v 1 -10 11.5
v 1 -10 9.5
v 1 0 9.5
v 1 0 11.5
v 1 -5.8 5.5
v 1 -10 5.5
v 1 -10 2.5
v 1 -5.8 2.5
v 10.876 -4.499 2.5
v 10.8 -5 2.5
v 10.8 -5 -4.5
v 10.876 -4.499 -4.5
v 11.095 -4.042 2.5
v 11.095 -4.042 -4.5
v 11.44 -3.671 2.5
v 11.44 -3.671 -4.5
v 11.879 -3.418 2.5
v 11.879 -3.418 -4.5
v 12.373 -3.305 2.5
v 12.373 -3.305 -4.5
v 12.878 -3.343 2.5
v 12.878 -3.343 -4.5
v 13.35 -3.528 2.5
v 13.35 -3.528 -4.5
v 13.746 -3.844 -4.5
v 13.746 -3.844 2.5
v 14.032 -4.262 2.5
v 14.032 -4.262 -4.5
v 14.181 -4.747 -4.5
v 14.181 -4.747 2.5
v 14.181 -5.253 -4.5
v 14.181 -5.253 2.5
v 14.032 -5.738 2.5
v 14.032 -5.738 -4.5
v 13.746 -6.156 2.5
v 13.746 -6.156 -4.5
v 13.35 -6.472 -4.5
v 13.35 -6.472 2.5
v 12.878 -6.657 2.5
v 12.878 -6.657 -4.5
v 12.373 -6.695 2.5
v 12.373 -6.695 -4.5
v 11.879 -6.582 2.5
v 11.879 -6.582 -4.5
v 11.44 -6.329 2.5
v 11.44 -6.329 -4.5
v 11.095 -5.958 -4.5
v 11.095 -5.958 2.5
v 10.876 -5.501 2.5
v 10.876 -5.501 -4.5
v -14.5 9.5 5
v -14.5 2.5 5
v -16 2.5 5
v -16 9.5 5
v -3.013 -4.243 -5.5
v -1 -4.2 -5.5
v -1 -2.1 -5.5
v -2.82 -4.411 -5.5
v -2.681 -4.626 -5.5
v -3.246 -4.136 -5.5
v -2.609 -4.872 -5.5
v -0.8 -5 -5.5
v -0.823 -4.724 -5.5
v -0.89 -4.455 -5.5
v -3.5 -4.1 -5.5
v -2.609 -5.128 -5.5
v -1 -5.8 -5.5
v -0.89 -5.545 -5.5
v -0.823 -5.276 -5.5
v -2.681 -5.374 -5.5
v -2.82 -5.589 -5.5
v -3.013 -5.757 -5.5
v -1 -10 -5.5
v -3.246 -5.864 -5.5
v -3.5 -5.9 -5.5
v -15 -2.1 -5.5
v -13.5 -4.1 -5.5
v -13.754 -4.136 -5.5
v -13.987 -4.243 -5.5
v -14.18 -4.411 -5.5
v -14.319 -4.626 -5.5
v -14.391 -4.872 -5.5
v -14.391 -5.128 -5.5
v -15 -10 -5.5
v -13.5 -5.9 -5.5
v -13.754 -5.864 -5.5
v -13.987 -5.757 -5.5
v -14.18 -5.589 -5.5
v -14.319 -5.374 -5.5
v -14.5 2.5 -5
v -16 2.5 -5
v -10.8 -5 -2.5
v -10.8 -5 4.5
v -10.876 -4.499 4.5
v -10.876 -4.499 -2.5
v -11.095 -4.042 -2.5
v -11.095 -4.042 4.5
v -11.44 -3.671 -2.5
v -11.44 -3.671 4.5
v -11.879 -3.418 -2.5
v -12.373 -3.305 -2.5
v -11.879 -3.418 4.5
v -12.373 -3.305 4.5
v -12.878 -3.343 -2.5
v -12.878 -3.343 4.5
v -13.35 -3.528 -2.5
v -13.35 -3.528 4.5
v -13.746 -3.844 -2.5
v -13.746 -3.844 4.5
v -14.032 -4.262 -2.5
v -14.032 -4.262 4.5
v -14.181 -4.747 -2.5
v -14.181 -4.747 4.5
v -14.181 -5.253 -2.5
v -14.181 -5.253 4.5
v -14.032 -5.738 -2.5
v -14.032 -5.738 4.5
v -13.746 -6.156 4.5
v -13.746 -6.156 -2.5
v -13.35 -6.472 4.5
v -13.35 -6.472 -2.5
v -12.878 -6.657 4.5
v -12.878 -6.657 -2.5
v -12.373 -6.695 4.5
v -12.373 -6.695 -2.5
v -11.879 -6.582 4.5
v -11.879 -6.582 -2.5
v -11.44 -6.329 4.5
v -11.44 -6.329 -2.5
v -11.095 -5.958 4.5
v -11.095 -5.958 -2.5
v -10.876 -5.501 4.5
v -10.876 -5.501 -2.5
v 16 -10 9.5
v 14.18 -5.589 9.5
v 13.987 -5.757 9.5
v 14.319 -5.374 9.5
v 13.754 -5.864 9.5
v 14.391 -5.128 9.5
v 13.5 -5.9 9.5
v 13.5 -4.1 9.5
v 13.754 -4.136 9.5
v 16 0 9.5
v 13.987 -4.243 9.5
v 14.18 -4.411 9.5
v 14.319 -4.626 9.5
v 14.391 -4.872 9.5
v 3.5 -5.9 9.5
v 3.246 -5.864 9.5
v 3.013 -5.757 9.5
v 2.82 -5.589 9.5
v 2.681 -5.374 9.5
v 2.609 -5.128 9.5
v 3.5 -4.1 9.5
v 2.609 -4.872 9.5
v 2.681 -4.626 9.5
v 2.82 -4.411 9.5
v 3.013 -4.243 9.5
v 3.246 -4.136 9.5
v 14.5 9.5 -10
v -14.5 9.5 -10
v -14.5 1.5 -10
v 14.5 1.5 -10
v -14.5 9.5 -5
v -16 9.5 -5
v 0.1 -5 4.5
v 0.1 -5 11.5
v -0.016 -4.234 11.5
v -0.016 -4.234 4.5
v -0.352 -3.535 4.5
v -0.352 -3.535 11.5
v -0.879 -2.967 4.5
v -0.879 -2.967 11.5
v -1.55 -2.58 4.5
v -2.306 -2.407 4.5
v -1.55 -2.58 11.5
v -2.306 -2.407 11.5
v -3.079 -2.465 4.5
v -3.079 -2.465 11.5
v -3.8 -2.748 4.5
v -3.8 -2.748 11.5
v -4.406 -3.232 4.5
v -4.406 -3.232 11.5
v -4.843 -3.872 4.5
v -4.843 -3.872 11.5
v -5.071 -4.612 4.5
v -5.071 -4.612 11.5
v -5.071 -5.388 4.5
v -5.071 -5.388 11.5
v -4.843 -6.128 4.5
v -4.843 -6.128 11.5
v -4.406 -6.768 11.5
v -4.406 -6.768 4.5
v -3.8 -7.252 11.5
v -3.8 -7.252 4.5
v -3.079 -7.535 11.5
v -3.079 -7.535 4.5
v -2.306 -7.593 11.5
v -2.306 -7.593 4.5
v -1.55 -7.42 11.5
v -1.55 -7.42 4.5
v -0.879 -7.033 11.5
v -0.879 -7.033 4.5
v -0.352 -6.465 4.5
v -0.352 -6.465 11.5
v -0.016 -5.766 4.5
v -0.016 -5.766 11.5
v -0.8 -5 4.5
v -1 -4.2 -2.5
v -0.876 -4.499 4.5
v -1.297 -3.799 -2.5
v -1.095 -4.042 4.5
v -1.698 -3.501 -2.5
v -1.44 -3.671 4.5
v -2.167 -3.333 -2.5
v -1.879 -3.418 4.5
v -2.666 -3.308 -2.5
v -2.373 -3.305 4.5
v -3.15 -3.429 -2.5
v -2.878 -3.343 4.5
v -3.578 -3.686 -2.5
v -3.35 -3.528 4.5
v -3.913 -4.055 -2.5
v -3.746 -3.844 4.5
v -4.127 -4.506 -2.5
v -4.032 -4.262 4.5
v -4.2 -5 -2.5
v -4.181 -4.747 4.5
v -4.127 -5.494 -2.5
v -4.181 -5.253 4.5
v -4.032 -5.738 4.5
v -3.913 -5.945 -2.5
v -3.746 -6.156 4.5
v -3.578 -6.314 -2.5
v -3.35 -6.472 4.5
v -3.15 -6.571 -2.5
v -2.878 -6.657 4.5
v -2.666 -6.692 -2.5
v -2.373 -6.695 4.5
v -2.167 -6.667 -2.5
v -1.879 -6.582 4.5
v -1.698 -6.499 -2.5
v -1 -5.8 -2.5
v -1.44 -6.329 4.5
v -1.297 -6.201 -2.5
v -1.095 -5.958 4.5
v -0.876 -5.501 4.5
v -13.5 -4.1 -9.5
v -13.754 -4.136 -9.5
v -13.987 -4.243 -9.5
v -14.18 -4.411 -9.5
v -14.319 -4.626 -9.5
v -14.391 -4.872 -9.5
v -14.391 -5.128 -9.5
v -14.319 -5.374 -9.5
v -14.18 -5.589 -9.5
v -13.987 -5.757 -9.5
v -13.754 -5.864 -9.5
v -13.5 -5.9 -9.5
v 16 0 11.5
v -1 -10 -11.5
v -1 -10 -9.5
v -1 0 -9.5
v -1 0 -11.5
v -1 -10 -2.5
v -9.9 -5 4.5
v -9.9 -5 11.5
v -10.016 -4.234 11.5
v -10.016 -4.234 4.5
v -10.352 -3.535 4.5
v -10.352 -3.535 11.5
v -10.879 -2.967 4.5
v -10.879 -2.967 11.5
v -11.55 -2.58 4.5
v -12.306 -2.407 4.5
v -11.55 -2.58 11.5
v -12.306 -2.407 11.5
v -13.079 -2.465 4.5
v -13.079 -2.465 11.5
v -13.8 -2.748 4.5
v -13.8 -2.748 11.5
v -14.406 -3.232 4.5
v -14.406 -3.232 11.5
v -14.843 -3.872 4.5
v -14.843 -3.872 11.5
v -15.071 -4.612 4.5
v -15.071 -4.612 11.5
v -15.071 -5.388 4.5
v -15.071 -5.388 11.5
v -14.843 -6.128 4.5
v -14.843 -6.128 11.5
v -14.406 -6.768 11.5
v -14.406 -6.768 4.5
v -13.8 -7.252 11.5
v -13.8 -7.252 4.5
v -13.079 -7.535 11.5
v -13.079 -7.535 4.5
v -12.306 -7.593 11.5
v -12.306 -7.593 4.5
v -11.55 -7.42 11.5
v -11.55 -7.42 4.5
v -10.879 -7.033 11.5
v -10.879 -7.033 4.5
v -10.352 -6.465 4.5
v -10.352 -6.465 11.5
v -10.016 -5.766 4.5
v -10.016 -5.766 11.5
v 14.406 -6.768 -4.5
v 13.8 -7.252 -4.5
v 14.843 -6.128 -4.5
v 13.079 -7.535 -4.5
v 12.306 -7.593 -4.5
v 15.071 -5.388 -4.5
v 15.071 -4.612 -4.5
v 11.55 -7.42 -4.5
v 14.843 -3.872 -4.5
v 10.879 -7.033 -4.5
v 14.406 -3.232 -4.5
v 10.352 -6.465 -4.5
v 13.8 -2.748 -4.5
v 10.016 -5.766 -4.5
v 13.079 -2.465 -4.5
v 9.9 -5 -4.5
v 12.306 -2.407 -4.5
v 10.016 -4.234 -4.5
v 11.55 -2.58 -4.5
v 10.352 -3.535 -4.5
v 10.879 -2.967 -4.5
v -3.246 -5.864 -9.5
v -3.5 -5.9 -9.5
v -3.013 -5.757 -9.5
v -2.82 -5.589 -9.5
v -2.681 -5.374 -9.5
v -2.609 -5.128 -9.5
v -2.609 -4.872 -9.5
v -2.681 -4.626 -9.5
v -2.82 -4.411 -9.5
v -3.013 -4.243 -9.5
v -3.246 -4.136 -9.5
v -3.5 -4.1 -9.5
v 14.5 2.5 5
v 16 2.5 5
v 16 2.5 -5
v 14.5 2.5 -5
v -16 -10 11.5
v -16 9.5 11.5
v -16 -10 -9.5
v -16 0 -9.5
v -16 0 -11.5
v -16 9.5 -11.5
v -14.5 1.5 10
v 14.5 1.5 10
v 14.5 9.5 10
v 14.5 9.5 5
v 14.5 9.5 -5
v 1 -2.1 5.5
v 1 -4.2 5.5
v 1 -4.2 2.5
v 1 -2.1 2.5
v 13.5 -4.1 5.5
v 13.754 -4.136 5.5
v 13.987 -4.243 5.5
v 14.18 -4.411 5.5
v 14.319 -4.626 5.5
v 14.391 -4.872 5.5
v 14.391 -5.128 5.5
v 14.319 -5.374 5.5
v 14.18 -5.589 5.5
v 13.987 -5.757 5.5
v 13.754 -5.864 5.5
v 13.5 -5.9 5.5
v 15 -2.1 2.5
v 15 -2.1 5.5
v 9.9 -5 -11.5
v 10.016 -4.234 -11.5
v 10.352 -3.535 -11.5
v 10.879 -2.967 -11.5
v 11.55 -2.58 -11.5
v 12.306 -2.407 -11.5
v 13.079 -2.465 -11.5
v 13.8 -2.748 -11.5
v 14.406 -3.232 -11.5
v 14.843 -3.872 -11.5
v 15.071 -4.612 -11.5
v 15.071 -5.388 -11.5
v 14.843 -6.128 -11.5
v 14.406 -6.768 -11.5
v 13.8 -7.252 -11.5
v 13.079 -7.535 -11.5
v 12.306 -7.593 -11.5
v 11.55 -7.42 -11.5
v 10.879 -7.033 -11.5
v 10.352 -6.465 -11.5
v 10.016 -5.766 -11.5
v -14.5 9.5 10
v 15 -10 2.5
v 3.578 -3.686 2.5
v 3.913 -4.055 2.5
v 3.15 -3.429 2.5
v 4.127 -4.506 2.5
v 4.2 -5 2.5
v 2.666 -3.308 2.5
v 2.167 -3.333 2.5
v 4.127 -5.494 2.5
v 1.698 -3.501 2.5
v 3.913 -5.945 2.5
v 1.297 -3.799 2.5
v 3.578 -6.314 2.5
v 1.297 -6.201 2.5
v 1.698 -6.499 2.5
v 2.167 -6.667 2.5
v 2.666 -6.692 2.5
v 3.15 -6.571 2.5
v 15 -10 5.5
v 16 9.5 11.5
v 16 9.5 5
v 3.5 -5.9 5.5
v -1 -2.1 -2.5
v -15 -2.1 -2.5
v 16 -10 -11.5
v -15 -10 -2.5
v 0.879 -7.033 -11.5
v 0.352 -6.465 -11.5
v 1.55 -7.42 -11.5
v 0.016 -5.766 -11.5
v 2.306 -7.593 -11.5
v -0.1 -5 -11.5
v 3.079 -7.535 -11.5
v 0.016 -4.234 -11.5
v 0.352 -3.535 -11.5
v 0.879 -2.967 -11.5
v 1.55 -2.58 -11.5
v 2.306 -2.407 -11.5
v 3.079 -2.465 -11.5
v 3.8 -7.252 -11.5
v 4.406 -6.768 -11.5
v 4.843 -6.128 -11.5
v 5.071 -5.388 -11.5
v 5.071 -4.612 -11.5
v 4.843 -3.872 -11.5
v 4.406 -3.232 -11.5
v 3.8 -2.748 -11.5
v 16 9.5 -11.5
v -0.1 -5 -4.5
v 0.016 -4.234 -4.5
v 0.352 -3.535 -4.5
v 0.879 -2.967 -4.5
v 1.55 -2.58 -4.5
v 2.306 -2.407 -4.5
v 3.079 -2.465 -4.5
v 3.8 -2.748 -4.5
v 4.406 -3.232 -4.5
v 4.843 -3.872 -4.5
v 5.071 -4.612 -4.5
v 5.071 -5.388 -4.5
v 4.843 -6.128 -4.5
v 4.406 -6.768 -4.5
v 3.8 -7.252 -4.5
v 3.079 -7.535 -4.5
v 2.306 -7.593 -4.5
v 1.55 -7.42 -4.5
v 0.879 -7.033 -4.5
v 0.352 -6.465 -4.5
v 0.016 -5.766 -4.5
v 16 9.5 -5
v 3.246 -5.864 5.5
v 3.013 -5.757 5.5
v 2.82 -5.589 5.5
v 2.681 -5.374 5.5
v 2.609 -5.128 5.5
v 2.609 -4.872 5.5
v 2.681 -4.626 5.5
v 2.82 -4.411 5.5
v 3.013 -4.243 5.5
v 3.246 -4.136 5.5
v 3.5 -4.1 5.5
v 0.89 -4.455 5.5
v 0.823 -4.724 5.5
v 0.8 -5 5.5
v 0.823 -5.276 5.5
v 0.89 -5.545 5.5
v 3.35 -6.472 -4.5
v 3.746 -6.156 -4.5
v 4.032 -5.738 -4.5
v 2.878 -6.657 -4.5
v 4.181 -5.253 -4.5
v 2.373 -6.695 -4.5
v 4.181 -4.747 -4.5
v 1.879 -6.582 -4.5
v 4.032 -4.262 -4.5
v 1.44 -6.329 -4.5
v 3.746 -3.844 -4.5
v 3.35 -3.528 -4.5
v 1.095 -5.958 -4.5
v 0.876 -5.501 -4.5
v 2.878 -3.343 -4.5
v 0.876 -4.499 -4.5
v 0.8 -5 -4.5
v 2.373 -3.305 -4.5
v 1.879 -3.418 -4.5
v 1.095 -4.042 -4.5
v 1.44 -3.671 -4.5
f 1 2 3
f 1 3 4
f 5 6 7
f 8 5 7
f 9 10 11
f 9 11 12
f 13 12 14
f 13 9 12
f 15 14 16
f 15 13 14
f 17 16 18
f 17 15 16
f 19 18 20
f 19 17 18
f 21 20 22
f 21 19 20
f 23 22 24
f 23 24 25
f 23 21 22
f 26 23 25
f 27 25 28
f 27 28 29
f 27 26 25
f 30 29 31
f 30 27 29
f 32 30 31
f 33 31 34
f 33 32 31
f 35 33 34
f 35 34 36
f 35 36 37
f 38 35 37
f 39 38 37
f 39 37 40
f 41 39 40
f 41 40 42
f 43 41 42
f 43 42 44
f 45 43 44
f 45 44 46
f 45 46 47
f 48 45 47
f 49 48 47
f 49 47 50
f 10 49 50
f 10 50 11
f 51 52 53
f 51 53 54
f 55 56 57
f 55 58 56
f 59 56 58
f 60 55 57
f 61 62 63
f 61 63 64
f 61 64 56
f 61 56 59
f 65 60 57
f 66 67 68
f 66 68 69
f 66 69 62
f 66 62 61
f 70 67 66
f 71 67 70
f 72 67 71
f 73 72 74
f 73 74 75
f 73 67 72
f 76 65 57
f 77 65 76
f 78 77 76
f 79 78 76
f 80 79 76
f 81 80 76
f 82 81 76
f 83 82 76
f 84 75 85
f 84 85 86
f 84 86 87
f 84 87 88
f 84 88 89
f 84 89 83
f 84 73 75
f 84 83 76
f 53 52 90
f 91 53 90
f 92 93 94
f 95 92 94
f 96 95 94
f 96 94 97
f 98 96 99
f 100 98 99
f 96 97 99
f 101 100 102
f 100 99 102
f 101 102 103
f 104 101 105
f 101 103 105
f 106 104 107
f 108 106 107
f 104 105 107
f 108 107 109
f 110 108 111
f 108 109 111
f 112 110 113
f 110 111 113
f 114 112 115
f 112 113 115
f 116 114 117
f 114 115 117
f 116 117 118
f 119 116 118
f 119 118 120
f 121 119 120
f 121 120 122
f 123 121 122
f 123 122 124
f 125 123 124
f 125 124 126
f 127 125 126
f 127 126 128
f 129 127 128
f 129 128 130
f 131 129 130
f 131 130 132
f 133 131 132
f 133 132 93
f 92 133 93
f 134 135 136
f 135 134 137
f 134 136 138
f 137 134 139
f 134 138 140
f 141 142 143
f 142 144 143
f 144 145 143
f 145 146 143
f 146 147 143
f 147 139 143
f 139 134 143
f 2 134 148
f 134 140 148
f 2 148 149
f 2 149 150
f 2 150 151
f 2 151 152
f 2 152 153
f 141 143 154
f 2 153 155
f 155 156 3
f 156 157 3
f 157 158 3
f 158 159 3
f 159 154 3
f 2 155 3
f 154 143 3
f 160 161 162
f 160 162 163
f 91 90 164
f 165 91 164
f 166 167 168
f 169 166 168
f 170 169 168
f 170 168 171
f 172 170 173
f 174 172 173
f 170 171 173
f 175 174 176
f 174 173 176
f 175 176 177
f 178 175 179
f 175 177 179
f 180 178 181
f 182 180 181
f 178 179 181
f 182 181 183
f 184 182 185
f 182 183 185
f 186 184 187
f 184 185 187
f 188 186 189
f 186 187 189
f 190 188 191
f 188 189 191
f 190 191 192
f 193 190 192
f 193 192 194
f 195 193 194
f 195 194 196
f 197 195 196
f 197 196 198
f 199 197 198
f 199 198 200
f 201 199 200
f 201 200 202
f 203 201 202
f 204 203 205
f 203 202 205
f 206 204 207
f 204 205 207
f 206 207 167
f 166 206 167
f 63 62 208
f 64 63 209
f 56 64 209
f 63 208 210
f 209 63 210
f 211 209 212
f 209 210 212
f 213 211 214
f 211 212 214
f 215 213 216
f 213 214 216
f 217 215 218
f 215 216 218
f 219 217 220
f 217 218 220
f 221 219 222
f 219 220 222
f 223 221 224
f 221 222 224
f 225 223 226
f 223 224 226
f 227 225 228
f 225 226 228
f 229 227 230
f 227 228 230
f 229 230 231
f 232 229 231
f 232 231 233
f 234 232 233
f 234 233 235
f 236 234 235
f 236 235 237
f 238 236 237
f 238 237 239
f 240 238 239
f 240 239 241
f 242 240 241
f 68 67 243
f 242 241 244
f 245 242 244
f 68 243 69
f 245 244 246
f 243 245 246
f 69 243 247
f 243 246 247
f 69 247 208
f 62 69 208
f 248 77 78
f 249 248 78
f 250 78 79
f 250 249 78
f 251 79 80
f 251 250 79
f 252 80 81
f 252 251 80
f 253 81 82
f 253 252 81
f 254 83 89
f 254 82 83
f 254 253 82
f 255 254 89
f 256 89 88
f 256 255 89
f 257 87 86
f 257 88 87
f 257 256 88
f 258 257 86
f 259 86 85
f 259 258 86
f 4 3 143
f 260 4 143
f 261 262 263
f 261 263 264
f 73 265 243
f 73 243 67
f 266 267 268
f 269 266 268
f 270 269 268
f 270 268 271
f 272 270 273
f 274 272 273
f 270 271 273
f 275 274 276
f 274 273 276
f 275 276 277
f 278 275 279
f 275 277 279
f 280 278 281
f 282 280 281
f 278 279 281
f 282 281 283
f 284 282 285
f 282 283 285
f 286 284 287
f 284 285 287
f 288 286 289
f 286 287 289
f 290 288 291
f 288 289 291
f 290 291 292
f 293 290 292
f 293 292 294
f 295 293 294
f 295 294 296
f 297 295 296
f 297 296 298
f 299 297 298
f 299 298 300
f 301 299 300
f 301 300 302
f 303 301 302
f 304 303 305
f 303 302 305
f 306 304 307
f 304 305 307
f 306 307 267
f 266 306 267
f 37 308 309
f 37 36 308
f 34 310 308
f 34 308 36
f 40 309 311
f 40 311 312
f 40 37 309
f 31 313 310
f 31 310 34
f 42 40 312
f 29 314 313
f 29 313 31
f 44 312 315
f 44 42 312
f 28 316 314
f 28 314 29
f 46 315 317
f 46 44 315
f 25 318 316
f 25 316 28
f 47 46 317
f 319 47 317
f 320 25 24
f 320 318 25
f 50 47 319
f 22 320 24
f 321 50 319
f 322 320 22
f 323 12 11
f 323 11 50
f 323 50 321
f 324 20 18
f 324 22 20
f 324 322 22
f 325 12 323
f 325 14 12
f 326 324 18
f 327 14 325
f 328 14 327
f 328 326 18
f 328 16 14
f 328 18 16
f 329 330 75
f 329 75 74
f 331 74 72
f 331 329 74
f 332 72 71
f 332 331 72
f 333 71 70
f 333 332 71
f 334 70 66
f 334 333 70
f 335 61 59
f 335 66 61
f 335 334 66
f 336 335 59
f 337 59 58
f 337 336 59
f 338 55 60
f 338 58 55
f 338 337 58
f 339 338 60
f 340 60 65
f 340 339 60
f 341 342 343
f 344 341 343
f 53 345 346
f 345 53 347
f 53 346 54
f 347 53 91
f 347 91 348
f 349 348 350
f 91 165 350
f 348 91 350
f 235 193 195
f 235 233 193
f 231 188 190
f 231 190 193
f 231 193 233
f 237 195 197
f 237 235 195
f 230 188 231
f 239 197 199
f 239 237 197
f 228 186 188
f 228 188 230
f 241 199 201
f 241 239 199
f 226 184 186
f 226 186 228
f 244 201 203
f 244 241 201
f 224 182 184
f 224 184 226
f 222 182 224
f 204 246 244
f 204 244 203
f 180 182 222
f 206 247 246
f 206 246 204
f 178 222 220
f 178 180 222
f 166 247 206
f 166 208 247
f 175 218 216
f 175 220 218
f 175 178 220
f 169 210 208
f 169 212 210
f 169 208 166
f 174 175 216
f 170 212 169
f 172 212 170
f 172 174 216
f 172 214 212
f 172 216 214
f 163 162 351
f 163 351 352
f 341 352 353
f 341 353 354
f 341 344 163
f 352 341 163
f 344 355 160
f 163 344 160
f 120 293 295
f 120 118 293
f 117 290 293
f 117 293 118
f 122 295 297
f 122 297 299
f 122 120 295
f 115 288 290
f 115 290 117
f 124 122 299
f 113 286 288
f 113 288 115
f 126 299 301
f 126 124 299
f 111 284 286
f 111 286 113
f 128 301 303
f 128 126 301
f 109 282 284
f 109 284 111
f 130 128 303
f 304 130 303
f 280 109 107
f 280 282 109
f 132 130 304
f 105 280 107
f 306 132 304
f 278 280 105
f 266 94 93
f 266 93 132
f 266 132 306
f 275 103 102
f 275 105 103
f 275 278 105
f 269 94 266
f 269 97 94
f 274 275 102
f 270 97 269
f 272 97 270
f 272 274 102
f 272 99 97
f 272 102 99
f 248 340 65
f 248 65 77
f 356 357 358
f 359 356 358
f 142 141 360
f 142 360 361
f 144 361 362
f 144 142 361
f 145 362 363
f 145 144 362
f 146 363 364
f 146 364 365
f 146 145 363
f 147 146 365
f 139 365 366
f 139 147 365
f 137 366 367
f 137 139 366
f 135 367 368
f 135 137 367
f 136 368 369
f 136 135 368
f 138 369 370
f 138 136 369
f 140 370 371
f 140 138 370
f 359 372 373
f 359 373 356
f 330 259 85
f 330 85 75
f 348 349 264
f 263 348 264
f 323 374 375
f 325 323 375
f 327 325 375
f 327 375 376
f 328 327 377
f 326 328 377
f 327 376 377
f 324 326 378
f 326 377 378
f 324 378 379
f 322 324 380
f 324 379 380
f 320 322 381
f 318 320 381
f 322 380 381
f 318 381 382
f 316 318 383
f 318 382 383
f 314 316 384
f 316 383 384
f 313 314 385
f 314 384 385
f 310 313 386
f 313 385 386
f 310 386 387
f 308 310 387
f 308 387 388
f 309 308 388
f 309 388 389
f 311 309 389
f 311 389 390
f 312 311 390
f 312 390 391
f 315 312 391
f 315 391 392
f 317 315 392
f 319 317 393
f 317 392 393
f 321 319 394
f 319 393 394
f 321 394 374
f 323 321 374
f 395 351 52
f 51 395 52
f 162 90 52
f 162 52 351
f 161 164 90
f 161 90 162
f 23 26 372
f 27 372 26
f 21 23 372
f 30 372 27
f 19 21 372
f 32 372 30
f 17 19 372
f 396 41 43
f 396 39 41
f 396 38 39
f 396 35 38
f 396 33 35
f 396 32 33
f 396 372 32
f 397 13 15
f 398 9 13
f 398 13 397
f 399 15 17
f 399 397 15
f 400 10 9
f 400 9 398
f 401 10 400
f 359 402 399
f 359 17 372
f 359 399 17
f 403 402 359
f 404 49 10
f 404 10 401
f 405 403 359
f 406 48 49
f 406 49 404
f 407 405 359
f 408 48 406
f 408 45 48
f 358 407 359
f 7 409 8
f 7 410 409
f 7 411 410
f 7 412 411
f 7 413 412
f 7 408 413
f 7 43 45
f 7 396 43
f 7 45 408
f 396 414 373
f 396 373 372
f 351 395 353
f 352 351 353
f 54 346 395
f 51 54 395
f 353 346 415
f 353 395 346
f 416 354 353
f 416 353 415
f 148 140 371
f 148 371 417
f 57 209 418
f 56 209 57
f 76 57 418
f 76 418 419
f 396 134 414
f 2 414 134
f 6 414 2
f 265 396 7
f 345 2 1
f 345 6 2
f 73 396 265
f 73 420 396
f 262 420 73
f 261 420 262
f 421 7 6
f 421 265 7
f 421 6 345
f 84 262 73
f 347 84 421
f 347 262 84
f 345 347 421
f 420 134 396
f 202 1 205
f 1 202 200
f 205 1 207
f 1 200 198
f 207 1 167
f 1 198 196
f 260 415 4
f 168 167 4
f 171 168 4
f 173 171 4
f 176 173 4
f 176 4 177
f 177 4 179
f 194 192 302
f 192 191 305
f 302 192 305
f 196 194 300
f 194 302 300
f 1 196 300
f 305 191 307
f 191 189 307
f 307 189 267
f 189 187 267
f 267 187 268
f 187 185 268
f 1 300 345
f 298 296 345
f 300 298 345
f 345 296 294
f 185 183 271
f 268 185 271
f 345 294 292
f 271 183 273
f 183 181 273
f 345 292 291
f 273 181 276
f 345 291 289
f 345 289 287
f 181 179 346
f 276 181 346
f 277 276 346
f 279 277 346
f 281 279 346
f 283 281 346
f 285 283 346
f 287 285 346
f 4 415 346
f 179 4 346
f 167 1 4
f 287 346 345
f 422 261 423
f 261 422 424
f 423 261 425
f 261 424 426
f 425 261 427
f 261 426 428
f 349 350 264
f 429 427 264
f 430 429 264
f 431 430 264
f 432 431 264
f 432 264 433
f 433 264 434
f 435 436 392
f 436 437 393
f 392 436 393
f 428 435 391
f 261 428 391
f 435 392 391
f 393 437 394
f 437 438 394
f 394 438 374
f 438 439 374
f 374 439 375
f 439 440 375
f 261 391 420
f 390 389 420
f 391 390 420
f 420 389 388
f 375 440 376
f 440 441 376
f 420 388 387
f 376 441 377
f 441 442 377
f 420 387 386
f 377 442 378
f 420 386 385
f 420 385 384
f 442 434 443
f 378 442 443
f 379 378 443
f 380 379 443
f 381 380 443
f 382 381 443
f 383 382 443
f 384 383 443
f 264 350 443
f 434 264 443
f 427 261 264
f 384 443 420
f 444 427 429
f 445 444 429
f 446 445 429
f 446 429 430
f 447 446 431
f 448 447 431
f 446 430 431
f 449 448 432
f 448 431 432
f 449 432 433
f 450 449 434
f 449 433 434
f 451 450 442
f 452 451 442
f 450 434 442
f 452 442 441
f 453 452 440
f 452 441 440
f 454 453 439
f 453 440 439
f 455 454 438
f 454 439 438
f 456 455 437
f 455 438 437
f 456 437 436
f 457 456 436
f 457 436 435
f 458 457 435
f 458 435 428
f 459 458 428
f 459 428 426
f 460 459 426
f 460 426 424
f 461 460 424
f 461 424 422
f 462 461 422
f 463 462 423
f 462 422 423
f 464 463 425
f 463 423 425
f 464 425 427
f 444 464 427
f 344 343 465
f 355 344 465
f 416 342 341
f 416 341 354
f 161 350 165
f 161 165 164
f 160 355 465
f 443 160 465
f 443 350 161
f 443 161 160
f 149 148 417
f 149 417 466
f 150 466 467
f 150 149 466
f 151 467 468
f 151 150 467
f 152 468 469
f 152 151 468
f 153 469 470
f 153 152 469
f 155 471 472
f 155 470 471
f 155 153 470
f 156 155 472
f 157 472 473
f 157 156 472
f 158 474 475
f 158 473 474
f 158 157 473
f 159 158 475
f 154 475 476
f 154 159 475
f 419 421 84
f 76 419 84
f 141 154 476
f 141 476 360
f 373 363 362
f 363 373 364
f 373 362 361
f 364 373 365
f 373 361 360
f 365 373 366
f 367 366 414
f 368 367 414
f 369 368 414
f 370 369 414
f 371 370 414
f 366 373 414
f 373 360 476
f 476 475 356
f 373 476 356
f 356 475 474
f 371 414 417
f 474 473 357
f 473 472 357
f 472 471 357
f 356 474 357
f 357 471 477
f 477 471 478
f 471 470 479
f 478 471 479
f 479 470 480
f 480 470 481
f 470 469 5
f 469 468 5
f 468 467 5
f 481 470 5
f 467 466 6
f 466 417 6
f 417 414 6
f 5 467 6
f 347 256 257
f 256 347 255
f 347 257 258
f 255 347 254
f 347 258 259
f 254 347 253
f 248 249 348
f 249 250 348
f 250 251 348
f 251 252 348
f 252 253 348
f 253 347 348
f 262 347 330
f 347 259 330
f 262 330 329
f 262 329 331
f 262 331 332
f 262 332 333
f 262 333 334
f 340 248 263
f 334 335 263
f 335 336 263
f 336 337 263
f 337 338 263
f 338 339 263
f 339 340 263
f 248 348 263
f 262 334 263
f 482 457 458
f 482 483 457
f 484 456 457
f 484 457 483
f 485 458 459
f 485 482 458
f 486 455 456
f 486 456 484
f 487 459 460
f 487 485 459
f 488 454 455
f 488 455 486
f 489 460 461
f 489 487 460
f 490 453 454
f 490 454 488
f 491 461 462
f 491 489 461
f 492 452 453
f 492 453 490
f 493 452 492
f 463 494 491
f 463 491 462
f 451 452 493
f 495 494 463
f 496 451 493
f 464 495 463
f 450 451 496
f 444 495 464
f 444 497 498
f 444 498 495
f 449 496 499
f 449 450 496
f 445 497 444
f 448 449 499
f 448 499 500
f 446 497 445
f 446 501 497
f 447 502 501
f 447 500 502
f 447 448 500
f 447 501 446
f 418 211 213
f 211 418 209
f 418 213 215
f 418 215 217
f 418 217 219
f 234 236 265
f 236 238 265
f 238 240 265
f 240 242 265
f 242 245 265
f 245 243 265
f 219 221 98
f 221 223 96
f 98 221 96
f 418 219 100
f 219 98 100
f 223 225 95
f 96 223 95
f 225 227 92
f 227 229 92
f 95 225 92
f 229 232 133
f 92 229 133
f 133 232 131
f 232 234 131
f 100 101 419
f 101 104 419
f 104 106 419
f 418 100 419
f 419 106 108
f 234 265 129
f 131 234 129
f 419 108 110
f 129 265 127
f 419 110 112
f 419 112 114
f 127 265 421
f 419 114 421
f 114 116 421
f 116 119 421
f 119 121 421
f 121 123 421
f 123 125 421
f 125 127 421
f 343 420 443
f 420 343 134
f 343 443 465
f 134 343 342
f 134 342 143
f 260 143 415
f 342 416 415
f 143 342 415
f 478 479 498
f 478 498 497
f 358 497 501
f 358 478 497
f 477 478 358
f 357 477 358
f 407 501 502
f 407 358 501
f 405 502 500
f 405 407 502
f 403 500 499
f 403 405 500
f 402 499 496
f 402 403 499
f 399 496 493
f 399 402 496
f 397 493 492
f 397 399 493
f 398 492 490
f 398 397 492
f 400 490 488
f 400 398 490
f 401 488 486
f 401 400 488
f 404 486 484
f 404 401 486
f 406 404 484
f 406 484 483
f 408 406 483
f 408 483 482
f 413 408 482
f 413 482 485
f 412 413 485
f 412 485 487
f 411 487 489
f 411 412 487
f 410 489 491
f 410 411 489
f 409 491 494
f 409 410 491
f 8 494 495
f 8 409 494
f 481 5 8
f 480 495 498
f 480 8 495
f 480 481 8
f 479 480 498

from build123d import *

# Parameters (mm, degrees)
SKETCH4_W           = 32
SKETCH4_H           = 23
BOSS_EXTRUDE3_DEPTH = 9.5
SKETCH5_W           = 29
SKETCH5_H           = 20
CUT_EXTRUDE2_DEPTH  = 8
SKETCH7_W           = 10
SKETCH7_H           = 7
CUT_EXTRUDE4_DEPTH  = 36.305806888
BOSS_EXTRUDE4_DEPTH = 10
CUT_EXTRUDE5_DEPTH  = 5
SKETCH10_W          = 14
SKETCH10_H          = 3
CUT_EXTRUDE6_DEPTH  = 7.9
CIRPATTERN1_COUNT   = 2
SKETCH11_R          = 2.6
CUT_EXTRUDE7_DEPTH  = 7
CIRPATTERN2_COUNT   = 2
CUT_EXTRUDE8_REACH  = 26.739
SKETCH12_R          = 1.7
CUT_EXTRUDE9_START  = -10
SKETCH13_R          = 1.7
CUT_EXTRUDE9_DEPTH  = 10


with BuildPart() as part:
    # Sketch4 → Boss-Extrude3 (new body)
    with BuildSketch(Plane(origin=(0, 0, 0), x_dir=(1, 0, 0), z_dir=(0, 1, 0))):
        Rectangle(SKETCH4_W, SKETCH4_H)
    extrude(amount=BOSS_EXTRUDE3_DEPTH)

    # Sketch5 → Cut-Extrude2 (cut)
    with BuildSketch(Plane(origin=(0, 9.5, 0), x_dir=(1, 0, 0), z_dir=(0, 1, 0))):
        Rectangle(SKETCH5_W, SKETCH5_H)
    extrude(amount=-CUT_EXTRUDE2_DEPTH, mode=Mode.SUBTRACT)

    # Sketch7 → Cut-Extrude4 (cut, through all)
    with BuildSketch(Plane(origin=(16, 0, 0), x_dir=(0, 0, -1), z_dir=(1, 0, 0))):
        with Locations((0, 6)):
            Rectangle(SKETCH7_W, SKETCH7_H)
    extrude(amount=-CUT_EXTRUDE4_DEPTH, mode=Mode.SUBTRACT)

    # Sketch8 → Boss-Extrude4 (add)
    with BuildSketch(Plane(origin=(0, 0, 0), x_dir=(-1, 0, 0), z_dir=(0, -1, 0))):
        Polygon((-16, -9.5), (-1, -9.5), (-1, -11.5), (16, -11.5), (16, 9.5), (1, 9.5), (1, 11.5), (-16, 11.5), align=None)
    extrude(amount=BOSS_EXTRUDE4_DEPTH)

    # Sketch9 → Cut-Extrude5 (cut)
    with BuildSketch(Plane(origin=(0, 0, -9.5), x_dir=(-1, 0, 0), z_dir=(0, 0, -1))):
        with BuildLine():
            Line((3.5, -4.1), (13.5, -4.1))
            ThreePointArc((13.5, -4.1), (14.4, -5), (13.5, -5.9))
            Line((13.5, -5.9), (3.5, -5.9))
            ThreePointArc((3.5, -5.9), (2.6, -5), (3.5, -4.1))
        make_face()
    cut_extrude5 = extrude(amount=-CUT_EXTRUDE5_DEPTH, mode=Mode.SUBTRACT)

    # Sketch10 → Cut-Extrude6 (cut)
    with BuildSketch(Plane(origin=(0, -10, 0), x_dir=(-1, 0, 0), z_dir=(0, -1, 0))):
        with Locations((-8, -4)):
            Rectangle(SKETCH10_W, SKETCH10_H)
        with Locations((8, 4)):
            Rectangle(SKETCH10_W, SKETCH10_H)
    extrude(amount=-CUT_EXTRUDE6_DEPTH, mode=Mode.SUBTRACT)

    # CirPattern1: Cut-Extrude5 ×2 about axis
    cirpattern1_axis = Axis((0, 0, 0), (0, -1, 0))
    for i in range(1, CIRPATTERN1_COUNT):
        add(cut_extrude5.rotate(cirpattern1_axis, i * 360 / CIRPATTERN1_COUNT), mode=Mode.SUBTRACT)

    # Sketch11 → Cut-Extrude7 (cut)
    with BuildSketch(Plane(origin=(0, 0, -11.5), x_dir=(-1, 0, 0), z_dir=(0, 0, -1))):
        with Locations((-12.5, -5)):
            Circle(SKETCH11_R)
        with Locations((-2.5, -5)):
            Circle(SKETCH11_R)
    cut_extrude7 = extrude(amount=-CUT_EXTRUDE7_DEPTH, mode=Mode.SUBTRACT)

    # CirPattern2: Cut-Extrude7 ×2 about axis
    cirpattern2_axis = Axis((0, 0, 0), (0, -1, 0))
    for i in range(1, CIRPATTERN2_COUNT):
        add(cut_extrude7.rotate(cirpattern2_axis, i * 360 / CIRPATTERN2_COUNT), mode=Mode.SUBTRACT)

    # Cut-Extrude8: up to this face of the body (flat: up to its plane)
    cut_extrude8_end = Plane(part.part.faces().sort_by_distance((-7.885932934, -6.28954084, -5.5))[0])
    # Sketch12 → Cut-Extrude8 (cut, up to the picked face)
    with BuildSketch(Plane.XY.offset(4.5), mode=Mode.PRIVATE) as cut_extrude8_sk1:
        with Locations((-2.5, -5)):
            Circle(SKETCH12_R)
    cut_extrude8_tool1 = split(extrude(cut_extrude8_sk1.sketch, amount=-CUT_EXTRUDE8_REACH, mode=Mode.PRIVATE), bisect_by=cut_extrude8_end, keep=Keep.BOTH, mode=Mode.PRIVATE)
    # Sketch12 → Cut-Extrude8 (cut, up to the picked face)
    with BuildSketch(Plane.XY.offset(4.5), mode=Mode.PRIVATE) as cut_extrude8_sk2:
        with Locations((-12.5, -5)):
            Circle(SKETCH12_R)
    cut_extrude8_tool2 = split(extrude(cut_extrude8_sk2.sketch, amount=-CUT_EXTRUDE8_REACH, mode=Mode.PRIVATE), bisect_by=cut_extrude8_end, keep=Keep.BOTH, mode=Mode.PRIVATE)
    add(cut_extrude8_tool1.solids().sort_by(Axis((-2.5, -5, 4.5), (0, 0, -1)))[0], mode=Mode.SUBTRACT)
    add(cut_extrude8_tool2.solids().sort_by(Axis((-12.5, -5, 4.5), (0, 0, -1)))[0], mode=Mode.SUBTRACT)

    # Sketch13 → Cut-Extrude9 (cut)
    with BuildSketch(Plane(origin=(0, 0, -4.5), x_dir=(-1, 0, 0), z_dir=(0, 0, -1)).offset(CUT_EXTRUDE9_START)):
        with Locations((-12.5, -5)):
            Circle(SKETCH13_R)
        with Locations((-2.5, -5)):
            Circle(SKETCH13_R)
    extrude(amount=CUT_EXTRUDE9_DEPTH, mode=Mode.SUBTRACT)


solid = part.part
